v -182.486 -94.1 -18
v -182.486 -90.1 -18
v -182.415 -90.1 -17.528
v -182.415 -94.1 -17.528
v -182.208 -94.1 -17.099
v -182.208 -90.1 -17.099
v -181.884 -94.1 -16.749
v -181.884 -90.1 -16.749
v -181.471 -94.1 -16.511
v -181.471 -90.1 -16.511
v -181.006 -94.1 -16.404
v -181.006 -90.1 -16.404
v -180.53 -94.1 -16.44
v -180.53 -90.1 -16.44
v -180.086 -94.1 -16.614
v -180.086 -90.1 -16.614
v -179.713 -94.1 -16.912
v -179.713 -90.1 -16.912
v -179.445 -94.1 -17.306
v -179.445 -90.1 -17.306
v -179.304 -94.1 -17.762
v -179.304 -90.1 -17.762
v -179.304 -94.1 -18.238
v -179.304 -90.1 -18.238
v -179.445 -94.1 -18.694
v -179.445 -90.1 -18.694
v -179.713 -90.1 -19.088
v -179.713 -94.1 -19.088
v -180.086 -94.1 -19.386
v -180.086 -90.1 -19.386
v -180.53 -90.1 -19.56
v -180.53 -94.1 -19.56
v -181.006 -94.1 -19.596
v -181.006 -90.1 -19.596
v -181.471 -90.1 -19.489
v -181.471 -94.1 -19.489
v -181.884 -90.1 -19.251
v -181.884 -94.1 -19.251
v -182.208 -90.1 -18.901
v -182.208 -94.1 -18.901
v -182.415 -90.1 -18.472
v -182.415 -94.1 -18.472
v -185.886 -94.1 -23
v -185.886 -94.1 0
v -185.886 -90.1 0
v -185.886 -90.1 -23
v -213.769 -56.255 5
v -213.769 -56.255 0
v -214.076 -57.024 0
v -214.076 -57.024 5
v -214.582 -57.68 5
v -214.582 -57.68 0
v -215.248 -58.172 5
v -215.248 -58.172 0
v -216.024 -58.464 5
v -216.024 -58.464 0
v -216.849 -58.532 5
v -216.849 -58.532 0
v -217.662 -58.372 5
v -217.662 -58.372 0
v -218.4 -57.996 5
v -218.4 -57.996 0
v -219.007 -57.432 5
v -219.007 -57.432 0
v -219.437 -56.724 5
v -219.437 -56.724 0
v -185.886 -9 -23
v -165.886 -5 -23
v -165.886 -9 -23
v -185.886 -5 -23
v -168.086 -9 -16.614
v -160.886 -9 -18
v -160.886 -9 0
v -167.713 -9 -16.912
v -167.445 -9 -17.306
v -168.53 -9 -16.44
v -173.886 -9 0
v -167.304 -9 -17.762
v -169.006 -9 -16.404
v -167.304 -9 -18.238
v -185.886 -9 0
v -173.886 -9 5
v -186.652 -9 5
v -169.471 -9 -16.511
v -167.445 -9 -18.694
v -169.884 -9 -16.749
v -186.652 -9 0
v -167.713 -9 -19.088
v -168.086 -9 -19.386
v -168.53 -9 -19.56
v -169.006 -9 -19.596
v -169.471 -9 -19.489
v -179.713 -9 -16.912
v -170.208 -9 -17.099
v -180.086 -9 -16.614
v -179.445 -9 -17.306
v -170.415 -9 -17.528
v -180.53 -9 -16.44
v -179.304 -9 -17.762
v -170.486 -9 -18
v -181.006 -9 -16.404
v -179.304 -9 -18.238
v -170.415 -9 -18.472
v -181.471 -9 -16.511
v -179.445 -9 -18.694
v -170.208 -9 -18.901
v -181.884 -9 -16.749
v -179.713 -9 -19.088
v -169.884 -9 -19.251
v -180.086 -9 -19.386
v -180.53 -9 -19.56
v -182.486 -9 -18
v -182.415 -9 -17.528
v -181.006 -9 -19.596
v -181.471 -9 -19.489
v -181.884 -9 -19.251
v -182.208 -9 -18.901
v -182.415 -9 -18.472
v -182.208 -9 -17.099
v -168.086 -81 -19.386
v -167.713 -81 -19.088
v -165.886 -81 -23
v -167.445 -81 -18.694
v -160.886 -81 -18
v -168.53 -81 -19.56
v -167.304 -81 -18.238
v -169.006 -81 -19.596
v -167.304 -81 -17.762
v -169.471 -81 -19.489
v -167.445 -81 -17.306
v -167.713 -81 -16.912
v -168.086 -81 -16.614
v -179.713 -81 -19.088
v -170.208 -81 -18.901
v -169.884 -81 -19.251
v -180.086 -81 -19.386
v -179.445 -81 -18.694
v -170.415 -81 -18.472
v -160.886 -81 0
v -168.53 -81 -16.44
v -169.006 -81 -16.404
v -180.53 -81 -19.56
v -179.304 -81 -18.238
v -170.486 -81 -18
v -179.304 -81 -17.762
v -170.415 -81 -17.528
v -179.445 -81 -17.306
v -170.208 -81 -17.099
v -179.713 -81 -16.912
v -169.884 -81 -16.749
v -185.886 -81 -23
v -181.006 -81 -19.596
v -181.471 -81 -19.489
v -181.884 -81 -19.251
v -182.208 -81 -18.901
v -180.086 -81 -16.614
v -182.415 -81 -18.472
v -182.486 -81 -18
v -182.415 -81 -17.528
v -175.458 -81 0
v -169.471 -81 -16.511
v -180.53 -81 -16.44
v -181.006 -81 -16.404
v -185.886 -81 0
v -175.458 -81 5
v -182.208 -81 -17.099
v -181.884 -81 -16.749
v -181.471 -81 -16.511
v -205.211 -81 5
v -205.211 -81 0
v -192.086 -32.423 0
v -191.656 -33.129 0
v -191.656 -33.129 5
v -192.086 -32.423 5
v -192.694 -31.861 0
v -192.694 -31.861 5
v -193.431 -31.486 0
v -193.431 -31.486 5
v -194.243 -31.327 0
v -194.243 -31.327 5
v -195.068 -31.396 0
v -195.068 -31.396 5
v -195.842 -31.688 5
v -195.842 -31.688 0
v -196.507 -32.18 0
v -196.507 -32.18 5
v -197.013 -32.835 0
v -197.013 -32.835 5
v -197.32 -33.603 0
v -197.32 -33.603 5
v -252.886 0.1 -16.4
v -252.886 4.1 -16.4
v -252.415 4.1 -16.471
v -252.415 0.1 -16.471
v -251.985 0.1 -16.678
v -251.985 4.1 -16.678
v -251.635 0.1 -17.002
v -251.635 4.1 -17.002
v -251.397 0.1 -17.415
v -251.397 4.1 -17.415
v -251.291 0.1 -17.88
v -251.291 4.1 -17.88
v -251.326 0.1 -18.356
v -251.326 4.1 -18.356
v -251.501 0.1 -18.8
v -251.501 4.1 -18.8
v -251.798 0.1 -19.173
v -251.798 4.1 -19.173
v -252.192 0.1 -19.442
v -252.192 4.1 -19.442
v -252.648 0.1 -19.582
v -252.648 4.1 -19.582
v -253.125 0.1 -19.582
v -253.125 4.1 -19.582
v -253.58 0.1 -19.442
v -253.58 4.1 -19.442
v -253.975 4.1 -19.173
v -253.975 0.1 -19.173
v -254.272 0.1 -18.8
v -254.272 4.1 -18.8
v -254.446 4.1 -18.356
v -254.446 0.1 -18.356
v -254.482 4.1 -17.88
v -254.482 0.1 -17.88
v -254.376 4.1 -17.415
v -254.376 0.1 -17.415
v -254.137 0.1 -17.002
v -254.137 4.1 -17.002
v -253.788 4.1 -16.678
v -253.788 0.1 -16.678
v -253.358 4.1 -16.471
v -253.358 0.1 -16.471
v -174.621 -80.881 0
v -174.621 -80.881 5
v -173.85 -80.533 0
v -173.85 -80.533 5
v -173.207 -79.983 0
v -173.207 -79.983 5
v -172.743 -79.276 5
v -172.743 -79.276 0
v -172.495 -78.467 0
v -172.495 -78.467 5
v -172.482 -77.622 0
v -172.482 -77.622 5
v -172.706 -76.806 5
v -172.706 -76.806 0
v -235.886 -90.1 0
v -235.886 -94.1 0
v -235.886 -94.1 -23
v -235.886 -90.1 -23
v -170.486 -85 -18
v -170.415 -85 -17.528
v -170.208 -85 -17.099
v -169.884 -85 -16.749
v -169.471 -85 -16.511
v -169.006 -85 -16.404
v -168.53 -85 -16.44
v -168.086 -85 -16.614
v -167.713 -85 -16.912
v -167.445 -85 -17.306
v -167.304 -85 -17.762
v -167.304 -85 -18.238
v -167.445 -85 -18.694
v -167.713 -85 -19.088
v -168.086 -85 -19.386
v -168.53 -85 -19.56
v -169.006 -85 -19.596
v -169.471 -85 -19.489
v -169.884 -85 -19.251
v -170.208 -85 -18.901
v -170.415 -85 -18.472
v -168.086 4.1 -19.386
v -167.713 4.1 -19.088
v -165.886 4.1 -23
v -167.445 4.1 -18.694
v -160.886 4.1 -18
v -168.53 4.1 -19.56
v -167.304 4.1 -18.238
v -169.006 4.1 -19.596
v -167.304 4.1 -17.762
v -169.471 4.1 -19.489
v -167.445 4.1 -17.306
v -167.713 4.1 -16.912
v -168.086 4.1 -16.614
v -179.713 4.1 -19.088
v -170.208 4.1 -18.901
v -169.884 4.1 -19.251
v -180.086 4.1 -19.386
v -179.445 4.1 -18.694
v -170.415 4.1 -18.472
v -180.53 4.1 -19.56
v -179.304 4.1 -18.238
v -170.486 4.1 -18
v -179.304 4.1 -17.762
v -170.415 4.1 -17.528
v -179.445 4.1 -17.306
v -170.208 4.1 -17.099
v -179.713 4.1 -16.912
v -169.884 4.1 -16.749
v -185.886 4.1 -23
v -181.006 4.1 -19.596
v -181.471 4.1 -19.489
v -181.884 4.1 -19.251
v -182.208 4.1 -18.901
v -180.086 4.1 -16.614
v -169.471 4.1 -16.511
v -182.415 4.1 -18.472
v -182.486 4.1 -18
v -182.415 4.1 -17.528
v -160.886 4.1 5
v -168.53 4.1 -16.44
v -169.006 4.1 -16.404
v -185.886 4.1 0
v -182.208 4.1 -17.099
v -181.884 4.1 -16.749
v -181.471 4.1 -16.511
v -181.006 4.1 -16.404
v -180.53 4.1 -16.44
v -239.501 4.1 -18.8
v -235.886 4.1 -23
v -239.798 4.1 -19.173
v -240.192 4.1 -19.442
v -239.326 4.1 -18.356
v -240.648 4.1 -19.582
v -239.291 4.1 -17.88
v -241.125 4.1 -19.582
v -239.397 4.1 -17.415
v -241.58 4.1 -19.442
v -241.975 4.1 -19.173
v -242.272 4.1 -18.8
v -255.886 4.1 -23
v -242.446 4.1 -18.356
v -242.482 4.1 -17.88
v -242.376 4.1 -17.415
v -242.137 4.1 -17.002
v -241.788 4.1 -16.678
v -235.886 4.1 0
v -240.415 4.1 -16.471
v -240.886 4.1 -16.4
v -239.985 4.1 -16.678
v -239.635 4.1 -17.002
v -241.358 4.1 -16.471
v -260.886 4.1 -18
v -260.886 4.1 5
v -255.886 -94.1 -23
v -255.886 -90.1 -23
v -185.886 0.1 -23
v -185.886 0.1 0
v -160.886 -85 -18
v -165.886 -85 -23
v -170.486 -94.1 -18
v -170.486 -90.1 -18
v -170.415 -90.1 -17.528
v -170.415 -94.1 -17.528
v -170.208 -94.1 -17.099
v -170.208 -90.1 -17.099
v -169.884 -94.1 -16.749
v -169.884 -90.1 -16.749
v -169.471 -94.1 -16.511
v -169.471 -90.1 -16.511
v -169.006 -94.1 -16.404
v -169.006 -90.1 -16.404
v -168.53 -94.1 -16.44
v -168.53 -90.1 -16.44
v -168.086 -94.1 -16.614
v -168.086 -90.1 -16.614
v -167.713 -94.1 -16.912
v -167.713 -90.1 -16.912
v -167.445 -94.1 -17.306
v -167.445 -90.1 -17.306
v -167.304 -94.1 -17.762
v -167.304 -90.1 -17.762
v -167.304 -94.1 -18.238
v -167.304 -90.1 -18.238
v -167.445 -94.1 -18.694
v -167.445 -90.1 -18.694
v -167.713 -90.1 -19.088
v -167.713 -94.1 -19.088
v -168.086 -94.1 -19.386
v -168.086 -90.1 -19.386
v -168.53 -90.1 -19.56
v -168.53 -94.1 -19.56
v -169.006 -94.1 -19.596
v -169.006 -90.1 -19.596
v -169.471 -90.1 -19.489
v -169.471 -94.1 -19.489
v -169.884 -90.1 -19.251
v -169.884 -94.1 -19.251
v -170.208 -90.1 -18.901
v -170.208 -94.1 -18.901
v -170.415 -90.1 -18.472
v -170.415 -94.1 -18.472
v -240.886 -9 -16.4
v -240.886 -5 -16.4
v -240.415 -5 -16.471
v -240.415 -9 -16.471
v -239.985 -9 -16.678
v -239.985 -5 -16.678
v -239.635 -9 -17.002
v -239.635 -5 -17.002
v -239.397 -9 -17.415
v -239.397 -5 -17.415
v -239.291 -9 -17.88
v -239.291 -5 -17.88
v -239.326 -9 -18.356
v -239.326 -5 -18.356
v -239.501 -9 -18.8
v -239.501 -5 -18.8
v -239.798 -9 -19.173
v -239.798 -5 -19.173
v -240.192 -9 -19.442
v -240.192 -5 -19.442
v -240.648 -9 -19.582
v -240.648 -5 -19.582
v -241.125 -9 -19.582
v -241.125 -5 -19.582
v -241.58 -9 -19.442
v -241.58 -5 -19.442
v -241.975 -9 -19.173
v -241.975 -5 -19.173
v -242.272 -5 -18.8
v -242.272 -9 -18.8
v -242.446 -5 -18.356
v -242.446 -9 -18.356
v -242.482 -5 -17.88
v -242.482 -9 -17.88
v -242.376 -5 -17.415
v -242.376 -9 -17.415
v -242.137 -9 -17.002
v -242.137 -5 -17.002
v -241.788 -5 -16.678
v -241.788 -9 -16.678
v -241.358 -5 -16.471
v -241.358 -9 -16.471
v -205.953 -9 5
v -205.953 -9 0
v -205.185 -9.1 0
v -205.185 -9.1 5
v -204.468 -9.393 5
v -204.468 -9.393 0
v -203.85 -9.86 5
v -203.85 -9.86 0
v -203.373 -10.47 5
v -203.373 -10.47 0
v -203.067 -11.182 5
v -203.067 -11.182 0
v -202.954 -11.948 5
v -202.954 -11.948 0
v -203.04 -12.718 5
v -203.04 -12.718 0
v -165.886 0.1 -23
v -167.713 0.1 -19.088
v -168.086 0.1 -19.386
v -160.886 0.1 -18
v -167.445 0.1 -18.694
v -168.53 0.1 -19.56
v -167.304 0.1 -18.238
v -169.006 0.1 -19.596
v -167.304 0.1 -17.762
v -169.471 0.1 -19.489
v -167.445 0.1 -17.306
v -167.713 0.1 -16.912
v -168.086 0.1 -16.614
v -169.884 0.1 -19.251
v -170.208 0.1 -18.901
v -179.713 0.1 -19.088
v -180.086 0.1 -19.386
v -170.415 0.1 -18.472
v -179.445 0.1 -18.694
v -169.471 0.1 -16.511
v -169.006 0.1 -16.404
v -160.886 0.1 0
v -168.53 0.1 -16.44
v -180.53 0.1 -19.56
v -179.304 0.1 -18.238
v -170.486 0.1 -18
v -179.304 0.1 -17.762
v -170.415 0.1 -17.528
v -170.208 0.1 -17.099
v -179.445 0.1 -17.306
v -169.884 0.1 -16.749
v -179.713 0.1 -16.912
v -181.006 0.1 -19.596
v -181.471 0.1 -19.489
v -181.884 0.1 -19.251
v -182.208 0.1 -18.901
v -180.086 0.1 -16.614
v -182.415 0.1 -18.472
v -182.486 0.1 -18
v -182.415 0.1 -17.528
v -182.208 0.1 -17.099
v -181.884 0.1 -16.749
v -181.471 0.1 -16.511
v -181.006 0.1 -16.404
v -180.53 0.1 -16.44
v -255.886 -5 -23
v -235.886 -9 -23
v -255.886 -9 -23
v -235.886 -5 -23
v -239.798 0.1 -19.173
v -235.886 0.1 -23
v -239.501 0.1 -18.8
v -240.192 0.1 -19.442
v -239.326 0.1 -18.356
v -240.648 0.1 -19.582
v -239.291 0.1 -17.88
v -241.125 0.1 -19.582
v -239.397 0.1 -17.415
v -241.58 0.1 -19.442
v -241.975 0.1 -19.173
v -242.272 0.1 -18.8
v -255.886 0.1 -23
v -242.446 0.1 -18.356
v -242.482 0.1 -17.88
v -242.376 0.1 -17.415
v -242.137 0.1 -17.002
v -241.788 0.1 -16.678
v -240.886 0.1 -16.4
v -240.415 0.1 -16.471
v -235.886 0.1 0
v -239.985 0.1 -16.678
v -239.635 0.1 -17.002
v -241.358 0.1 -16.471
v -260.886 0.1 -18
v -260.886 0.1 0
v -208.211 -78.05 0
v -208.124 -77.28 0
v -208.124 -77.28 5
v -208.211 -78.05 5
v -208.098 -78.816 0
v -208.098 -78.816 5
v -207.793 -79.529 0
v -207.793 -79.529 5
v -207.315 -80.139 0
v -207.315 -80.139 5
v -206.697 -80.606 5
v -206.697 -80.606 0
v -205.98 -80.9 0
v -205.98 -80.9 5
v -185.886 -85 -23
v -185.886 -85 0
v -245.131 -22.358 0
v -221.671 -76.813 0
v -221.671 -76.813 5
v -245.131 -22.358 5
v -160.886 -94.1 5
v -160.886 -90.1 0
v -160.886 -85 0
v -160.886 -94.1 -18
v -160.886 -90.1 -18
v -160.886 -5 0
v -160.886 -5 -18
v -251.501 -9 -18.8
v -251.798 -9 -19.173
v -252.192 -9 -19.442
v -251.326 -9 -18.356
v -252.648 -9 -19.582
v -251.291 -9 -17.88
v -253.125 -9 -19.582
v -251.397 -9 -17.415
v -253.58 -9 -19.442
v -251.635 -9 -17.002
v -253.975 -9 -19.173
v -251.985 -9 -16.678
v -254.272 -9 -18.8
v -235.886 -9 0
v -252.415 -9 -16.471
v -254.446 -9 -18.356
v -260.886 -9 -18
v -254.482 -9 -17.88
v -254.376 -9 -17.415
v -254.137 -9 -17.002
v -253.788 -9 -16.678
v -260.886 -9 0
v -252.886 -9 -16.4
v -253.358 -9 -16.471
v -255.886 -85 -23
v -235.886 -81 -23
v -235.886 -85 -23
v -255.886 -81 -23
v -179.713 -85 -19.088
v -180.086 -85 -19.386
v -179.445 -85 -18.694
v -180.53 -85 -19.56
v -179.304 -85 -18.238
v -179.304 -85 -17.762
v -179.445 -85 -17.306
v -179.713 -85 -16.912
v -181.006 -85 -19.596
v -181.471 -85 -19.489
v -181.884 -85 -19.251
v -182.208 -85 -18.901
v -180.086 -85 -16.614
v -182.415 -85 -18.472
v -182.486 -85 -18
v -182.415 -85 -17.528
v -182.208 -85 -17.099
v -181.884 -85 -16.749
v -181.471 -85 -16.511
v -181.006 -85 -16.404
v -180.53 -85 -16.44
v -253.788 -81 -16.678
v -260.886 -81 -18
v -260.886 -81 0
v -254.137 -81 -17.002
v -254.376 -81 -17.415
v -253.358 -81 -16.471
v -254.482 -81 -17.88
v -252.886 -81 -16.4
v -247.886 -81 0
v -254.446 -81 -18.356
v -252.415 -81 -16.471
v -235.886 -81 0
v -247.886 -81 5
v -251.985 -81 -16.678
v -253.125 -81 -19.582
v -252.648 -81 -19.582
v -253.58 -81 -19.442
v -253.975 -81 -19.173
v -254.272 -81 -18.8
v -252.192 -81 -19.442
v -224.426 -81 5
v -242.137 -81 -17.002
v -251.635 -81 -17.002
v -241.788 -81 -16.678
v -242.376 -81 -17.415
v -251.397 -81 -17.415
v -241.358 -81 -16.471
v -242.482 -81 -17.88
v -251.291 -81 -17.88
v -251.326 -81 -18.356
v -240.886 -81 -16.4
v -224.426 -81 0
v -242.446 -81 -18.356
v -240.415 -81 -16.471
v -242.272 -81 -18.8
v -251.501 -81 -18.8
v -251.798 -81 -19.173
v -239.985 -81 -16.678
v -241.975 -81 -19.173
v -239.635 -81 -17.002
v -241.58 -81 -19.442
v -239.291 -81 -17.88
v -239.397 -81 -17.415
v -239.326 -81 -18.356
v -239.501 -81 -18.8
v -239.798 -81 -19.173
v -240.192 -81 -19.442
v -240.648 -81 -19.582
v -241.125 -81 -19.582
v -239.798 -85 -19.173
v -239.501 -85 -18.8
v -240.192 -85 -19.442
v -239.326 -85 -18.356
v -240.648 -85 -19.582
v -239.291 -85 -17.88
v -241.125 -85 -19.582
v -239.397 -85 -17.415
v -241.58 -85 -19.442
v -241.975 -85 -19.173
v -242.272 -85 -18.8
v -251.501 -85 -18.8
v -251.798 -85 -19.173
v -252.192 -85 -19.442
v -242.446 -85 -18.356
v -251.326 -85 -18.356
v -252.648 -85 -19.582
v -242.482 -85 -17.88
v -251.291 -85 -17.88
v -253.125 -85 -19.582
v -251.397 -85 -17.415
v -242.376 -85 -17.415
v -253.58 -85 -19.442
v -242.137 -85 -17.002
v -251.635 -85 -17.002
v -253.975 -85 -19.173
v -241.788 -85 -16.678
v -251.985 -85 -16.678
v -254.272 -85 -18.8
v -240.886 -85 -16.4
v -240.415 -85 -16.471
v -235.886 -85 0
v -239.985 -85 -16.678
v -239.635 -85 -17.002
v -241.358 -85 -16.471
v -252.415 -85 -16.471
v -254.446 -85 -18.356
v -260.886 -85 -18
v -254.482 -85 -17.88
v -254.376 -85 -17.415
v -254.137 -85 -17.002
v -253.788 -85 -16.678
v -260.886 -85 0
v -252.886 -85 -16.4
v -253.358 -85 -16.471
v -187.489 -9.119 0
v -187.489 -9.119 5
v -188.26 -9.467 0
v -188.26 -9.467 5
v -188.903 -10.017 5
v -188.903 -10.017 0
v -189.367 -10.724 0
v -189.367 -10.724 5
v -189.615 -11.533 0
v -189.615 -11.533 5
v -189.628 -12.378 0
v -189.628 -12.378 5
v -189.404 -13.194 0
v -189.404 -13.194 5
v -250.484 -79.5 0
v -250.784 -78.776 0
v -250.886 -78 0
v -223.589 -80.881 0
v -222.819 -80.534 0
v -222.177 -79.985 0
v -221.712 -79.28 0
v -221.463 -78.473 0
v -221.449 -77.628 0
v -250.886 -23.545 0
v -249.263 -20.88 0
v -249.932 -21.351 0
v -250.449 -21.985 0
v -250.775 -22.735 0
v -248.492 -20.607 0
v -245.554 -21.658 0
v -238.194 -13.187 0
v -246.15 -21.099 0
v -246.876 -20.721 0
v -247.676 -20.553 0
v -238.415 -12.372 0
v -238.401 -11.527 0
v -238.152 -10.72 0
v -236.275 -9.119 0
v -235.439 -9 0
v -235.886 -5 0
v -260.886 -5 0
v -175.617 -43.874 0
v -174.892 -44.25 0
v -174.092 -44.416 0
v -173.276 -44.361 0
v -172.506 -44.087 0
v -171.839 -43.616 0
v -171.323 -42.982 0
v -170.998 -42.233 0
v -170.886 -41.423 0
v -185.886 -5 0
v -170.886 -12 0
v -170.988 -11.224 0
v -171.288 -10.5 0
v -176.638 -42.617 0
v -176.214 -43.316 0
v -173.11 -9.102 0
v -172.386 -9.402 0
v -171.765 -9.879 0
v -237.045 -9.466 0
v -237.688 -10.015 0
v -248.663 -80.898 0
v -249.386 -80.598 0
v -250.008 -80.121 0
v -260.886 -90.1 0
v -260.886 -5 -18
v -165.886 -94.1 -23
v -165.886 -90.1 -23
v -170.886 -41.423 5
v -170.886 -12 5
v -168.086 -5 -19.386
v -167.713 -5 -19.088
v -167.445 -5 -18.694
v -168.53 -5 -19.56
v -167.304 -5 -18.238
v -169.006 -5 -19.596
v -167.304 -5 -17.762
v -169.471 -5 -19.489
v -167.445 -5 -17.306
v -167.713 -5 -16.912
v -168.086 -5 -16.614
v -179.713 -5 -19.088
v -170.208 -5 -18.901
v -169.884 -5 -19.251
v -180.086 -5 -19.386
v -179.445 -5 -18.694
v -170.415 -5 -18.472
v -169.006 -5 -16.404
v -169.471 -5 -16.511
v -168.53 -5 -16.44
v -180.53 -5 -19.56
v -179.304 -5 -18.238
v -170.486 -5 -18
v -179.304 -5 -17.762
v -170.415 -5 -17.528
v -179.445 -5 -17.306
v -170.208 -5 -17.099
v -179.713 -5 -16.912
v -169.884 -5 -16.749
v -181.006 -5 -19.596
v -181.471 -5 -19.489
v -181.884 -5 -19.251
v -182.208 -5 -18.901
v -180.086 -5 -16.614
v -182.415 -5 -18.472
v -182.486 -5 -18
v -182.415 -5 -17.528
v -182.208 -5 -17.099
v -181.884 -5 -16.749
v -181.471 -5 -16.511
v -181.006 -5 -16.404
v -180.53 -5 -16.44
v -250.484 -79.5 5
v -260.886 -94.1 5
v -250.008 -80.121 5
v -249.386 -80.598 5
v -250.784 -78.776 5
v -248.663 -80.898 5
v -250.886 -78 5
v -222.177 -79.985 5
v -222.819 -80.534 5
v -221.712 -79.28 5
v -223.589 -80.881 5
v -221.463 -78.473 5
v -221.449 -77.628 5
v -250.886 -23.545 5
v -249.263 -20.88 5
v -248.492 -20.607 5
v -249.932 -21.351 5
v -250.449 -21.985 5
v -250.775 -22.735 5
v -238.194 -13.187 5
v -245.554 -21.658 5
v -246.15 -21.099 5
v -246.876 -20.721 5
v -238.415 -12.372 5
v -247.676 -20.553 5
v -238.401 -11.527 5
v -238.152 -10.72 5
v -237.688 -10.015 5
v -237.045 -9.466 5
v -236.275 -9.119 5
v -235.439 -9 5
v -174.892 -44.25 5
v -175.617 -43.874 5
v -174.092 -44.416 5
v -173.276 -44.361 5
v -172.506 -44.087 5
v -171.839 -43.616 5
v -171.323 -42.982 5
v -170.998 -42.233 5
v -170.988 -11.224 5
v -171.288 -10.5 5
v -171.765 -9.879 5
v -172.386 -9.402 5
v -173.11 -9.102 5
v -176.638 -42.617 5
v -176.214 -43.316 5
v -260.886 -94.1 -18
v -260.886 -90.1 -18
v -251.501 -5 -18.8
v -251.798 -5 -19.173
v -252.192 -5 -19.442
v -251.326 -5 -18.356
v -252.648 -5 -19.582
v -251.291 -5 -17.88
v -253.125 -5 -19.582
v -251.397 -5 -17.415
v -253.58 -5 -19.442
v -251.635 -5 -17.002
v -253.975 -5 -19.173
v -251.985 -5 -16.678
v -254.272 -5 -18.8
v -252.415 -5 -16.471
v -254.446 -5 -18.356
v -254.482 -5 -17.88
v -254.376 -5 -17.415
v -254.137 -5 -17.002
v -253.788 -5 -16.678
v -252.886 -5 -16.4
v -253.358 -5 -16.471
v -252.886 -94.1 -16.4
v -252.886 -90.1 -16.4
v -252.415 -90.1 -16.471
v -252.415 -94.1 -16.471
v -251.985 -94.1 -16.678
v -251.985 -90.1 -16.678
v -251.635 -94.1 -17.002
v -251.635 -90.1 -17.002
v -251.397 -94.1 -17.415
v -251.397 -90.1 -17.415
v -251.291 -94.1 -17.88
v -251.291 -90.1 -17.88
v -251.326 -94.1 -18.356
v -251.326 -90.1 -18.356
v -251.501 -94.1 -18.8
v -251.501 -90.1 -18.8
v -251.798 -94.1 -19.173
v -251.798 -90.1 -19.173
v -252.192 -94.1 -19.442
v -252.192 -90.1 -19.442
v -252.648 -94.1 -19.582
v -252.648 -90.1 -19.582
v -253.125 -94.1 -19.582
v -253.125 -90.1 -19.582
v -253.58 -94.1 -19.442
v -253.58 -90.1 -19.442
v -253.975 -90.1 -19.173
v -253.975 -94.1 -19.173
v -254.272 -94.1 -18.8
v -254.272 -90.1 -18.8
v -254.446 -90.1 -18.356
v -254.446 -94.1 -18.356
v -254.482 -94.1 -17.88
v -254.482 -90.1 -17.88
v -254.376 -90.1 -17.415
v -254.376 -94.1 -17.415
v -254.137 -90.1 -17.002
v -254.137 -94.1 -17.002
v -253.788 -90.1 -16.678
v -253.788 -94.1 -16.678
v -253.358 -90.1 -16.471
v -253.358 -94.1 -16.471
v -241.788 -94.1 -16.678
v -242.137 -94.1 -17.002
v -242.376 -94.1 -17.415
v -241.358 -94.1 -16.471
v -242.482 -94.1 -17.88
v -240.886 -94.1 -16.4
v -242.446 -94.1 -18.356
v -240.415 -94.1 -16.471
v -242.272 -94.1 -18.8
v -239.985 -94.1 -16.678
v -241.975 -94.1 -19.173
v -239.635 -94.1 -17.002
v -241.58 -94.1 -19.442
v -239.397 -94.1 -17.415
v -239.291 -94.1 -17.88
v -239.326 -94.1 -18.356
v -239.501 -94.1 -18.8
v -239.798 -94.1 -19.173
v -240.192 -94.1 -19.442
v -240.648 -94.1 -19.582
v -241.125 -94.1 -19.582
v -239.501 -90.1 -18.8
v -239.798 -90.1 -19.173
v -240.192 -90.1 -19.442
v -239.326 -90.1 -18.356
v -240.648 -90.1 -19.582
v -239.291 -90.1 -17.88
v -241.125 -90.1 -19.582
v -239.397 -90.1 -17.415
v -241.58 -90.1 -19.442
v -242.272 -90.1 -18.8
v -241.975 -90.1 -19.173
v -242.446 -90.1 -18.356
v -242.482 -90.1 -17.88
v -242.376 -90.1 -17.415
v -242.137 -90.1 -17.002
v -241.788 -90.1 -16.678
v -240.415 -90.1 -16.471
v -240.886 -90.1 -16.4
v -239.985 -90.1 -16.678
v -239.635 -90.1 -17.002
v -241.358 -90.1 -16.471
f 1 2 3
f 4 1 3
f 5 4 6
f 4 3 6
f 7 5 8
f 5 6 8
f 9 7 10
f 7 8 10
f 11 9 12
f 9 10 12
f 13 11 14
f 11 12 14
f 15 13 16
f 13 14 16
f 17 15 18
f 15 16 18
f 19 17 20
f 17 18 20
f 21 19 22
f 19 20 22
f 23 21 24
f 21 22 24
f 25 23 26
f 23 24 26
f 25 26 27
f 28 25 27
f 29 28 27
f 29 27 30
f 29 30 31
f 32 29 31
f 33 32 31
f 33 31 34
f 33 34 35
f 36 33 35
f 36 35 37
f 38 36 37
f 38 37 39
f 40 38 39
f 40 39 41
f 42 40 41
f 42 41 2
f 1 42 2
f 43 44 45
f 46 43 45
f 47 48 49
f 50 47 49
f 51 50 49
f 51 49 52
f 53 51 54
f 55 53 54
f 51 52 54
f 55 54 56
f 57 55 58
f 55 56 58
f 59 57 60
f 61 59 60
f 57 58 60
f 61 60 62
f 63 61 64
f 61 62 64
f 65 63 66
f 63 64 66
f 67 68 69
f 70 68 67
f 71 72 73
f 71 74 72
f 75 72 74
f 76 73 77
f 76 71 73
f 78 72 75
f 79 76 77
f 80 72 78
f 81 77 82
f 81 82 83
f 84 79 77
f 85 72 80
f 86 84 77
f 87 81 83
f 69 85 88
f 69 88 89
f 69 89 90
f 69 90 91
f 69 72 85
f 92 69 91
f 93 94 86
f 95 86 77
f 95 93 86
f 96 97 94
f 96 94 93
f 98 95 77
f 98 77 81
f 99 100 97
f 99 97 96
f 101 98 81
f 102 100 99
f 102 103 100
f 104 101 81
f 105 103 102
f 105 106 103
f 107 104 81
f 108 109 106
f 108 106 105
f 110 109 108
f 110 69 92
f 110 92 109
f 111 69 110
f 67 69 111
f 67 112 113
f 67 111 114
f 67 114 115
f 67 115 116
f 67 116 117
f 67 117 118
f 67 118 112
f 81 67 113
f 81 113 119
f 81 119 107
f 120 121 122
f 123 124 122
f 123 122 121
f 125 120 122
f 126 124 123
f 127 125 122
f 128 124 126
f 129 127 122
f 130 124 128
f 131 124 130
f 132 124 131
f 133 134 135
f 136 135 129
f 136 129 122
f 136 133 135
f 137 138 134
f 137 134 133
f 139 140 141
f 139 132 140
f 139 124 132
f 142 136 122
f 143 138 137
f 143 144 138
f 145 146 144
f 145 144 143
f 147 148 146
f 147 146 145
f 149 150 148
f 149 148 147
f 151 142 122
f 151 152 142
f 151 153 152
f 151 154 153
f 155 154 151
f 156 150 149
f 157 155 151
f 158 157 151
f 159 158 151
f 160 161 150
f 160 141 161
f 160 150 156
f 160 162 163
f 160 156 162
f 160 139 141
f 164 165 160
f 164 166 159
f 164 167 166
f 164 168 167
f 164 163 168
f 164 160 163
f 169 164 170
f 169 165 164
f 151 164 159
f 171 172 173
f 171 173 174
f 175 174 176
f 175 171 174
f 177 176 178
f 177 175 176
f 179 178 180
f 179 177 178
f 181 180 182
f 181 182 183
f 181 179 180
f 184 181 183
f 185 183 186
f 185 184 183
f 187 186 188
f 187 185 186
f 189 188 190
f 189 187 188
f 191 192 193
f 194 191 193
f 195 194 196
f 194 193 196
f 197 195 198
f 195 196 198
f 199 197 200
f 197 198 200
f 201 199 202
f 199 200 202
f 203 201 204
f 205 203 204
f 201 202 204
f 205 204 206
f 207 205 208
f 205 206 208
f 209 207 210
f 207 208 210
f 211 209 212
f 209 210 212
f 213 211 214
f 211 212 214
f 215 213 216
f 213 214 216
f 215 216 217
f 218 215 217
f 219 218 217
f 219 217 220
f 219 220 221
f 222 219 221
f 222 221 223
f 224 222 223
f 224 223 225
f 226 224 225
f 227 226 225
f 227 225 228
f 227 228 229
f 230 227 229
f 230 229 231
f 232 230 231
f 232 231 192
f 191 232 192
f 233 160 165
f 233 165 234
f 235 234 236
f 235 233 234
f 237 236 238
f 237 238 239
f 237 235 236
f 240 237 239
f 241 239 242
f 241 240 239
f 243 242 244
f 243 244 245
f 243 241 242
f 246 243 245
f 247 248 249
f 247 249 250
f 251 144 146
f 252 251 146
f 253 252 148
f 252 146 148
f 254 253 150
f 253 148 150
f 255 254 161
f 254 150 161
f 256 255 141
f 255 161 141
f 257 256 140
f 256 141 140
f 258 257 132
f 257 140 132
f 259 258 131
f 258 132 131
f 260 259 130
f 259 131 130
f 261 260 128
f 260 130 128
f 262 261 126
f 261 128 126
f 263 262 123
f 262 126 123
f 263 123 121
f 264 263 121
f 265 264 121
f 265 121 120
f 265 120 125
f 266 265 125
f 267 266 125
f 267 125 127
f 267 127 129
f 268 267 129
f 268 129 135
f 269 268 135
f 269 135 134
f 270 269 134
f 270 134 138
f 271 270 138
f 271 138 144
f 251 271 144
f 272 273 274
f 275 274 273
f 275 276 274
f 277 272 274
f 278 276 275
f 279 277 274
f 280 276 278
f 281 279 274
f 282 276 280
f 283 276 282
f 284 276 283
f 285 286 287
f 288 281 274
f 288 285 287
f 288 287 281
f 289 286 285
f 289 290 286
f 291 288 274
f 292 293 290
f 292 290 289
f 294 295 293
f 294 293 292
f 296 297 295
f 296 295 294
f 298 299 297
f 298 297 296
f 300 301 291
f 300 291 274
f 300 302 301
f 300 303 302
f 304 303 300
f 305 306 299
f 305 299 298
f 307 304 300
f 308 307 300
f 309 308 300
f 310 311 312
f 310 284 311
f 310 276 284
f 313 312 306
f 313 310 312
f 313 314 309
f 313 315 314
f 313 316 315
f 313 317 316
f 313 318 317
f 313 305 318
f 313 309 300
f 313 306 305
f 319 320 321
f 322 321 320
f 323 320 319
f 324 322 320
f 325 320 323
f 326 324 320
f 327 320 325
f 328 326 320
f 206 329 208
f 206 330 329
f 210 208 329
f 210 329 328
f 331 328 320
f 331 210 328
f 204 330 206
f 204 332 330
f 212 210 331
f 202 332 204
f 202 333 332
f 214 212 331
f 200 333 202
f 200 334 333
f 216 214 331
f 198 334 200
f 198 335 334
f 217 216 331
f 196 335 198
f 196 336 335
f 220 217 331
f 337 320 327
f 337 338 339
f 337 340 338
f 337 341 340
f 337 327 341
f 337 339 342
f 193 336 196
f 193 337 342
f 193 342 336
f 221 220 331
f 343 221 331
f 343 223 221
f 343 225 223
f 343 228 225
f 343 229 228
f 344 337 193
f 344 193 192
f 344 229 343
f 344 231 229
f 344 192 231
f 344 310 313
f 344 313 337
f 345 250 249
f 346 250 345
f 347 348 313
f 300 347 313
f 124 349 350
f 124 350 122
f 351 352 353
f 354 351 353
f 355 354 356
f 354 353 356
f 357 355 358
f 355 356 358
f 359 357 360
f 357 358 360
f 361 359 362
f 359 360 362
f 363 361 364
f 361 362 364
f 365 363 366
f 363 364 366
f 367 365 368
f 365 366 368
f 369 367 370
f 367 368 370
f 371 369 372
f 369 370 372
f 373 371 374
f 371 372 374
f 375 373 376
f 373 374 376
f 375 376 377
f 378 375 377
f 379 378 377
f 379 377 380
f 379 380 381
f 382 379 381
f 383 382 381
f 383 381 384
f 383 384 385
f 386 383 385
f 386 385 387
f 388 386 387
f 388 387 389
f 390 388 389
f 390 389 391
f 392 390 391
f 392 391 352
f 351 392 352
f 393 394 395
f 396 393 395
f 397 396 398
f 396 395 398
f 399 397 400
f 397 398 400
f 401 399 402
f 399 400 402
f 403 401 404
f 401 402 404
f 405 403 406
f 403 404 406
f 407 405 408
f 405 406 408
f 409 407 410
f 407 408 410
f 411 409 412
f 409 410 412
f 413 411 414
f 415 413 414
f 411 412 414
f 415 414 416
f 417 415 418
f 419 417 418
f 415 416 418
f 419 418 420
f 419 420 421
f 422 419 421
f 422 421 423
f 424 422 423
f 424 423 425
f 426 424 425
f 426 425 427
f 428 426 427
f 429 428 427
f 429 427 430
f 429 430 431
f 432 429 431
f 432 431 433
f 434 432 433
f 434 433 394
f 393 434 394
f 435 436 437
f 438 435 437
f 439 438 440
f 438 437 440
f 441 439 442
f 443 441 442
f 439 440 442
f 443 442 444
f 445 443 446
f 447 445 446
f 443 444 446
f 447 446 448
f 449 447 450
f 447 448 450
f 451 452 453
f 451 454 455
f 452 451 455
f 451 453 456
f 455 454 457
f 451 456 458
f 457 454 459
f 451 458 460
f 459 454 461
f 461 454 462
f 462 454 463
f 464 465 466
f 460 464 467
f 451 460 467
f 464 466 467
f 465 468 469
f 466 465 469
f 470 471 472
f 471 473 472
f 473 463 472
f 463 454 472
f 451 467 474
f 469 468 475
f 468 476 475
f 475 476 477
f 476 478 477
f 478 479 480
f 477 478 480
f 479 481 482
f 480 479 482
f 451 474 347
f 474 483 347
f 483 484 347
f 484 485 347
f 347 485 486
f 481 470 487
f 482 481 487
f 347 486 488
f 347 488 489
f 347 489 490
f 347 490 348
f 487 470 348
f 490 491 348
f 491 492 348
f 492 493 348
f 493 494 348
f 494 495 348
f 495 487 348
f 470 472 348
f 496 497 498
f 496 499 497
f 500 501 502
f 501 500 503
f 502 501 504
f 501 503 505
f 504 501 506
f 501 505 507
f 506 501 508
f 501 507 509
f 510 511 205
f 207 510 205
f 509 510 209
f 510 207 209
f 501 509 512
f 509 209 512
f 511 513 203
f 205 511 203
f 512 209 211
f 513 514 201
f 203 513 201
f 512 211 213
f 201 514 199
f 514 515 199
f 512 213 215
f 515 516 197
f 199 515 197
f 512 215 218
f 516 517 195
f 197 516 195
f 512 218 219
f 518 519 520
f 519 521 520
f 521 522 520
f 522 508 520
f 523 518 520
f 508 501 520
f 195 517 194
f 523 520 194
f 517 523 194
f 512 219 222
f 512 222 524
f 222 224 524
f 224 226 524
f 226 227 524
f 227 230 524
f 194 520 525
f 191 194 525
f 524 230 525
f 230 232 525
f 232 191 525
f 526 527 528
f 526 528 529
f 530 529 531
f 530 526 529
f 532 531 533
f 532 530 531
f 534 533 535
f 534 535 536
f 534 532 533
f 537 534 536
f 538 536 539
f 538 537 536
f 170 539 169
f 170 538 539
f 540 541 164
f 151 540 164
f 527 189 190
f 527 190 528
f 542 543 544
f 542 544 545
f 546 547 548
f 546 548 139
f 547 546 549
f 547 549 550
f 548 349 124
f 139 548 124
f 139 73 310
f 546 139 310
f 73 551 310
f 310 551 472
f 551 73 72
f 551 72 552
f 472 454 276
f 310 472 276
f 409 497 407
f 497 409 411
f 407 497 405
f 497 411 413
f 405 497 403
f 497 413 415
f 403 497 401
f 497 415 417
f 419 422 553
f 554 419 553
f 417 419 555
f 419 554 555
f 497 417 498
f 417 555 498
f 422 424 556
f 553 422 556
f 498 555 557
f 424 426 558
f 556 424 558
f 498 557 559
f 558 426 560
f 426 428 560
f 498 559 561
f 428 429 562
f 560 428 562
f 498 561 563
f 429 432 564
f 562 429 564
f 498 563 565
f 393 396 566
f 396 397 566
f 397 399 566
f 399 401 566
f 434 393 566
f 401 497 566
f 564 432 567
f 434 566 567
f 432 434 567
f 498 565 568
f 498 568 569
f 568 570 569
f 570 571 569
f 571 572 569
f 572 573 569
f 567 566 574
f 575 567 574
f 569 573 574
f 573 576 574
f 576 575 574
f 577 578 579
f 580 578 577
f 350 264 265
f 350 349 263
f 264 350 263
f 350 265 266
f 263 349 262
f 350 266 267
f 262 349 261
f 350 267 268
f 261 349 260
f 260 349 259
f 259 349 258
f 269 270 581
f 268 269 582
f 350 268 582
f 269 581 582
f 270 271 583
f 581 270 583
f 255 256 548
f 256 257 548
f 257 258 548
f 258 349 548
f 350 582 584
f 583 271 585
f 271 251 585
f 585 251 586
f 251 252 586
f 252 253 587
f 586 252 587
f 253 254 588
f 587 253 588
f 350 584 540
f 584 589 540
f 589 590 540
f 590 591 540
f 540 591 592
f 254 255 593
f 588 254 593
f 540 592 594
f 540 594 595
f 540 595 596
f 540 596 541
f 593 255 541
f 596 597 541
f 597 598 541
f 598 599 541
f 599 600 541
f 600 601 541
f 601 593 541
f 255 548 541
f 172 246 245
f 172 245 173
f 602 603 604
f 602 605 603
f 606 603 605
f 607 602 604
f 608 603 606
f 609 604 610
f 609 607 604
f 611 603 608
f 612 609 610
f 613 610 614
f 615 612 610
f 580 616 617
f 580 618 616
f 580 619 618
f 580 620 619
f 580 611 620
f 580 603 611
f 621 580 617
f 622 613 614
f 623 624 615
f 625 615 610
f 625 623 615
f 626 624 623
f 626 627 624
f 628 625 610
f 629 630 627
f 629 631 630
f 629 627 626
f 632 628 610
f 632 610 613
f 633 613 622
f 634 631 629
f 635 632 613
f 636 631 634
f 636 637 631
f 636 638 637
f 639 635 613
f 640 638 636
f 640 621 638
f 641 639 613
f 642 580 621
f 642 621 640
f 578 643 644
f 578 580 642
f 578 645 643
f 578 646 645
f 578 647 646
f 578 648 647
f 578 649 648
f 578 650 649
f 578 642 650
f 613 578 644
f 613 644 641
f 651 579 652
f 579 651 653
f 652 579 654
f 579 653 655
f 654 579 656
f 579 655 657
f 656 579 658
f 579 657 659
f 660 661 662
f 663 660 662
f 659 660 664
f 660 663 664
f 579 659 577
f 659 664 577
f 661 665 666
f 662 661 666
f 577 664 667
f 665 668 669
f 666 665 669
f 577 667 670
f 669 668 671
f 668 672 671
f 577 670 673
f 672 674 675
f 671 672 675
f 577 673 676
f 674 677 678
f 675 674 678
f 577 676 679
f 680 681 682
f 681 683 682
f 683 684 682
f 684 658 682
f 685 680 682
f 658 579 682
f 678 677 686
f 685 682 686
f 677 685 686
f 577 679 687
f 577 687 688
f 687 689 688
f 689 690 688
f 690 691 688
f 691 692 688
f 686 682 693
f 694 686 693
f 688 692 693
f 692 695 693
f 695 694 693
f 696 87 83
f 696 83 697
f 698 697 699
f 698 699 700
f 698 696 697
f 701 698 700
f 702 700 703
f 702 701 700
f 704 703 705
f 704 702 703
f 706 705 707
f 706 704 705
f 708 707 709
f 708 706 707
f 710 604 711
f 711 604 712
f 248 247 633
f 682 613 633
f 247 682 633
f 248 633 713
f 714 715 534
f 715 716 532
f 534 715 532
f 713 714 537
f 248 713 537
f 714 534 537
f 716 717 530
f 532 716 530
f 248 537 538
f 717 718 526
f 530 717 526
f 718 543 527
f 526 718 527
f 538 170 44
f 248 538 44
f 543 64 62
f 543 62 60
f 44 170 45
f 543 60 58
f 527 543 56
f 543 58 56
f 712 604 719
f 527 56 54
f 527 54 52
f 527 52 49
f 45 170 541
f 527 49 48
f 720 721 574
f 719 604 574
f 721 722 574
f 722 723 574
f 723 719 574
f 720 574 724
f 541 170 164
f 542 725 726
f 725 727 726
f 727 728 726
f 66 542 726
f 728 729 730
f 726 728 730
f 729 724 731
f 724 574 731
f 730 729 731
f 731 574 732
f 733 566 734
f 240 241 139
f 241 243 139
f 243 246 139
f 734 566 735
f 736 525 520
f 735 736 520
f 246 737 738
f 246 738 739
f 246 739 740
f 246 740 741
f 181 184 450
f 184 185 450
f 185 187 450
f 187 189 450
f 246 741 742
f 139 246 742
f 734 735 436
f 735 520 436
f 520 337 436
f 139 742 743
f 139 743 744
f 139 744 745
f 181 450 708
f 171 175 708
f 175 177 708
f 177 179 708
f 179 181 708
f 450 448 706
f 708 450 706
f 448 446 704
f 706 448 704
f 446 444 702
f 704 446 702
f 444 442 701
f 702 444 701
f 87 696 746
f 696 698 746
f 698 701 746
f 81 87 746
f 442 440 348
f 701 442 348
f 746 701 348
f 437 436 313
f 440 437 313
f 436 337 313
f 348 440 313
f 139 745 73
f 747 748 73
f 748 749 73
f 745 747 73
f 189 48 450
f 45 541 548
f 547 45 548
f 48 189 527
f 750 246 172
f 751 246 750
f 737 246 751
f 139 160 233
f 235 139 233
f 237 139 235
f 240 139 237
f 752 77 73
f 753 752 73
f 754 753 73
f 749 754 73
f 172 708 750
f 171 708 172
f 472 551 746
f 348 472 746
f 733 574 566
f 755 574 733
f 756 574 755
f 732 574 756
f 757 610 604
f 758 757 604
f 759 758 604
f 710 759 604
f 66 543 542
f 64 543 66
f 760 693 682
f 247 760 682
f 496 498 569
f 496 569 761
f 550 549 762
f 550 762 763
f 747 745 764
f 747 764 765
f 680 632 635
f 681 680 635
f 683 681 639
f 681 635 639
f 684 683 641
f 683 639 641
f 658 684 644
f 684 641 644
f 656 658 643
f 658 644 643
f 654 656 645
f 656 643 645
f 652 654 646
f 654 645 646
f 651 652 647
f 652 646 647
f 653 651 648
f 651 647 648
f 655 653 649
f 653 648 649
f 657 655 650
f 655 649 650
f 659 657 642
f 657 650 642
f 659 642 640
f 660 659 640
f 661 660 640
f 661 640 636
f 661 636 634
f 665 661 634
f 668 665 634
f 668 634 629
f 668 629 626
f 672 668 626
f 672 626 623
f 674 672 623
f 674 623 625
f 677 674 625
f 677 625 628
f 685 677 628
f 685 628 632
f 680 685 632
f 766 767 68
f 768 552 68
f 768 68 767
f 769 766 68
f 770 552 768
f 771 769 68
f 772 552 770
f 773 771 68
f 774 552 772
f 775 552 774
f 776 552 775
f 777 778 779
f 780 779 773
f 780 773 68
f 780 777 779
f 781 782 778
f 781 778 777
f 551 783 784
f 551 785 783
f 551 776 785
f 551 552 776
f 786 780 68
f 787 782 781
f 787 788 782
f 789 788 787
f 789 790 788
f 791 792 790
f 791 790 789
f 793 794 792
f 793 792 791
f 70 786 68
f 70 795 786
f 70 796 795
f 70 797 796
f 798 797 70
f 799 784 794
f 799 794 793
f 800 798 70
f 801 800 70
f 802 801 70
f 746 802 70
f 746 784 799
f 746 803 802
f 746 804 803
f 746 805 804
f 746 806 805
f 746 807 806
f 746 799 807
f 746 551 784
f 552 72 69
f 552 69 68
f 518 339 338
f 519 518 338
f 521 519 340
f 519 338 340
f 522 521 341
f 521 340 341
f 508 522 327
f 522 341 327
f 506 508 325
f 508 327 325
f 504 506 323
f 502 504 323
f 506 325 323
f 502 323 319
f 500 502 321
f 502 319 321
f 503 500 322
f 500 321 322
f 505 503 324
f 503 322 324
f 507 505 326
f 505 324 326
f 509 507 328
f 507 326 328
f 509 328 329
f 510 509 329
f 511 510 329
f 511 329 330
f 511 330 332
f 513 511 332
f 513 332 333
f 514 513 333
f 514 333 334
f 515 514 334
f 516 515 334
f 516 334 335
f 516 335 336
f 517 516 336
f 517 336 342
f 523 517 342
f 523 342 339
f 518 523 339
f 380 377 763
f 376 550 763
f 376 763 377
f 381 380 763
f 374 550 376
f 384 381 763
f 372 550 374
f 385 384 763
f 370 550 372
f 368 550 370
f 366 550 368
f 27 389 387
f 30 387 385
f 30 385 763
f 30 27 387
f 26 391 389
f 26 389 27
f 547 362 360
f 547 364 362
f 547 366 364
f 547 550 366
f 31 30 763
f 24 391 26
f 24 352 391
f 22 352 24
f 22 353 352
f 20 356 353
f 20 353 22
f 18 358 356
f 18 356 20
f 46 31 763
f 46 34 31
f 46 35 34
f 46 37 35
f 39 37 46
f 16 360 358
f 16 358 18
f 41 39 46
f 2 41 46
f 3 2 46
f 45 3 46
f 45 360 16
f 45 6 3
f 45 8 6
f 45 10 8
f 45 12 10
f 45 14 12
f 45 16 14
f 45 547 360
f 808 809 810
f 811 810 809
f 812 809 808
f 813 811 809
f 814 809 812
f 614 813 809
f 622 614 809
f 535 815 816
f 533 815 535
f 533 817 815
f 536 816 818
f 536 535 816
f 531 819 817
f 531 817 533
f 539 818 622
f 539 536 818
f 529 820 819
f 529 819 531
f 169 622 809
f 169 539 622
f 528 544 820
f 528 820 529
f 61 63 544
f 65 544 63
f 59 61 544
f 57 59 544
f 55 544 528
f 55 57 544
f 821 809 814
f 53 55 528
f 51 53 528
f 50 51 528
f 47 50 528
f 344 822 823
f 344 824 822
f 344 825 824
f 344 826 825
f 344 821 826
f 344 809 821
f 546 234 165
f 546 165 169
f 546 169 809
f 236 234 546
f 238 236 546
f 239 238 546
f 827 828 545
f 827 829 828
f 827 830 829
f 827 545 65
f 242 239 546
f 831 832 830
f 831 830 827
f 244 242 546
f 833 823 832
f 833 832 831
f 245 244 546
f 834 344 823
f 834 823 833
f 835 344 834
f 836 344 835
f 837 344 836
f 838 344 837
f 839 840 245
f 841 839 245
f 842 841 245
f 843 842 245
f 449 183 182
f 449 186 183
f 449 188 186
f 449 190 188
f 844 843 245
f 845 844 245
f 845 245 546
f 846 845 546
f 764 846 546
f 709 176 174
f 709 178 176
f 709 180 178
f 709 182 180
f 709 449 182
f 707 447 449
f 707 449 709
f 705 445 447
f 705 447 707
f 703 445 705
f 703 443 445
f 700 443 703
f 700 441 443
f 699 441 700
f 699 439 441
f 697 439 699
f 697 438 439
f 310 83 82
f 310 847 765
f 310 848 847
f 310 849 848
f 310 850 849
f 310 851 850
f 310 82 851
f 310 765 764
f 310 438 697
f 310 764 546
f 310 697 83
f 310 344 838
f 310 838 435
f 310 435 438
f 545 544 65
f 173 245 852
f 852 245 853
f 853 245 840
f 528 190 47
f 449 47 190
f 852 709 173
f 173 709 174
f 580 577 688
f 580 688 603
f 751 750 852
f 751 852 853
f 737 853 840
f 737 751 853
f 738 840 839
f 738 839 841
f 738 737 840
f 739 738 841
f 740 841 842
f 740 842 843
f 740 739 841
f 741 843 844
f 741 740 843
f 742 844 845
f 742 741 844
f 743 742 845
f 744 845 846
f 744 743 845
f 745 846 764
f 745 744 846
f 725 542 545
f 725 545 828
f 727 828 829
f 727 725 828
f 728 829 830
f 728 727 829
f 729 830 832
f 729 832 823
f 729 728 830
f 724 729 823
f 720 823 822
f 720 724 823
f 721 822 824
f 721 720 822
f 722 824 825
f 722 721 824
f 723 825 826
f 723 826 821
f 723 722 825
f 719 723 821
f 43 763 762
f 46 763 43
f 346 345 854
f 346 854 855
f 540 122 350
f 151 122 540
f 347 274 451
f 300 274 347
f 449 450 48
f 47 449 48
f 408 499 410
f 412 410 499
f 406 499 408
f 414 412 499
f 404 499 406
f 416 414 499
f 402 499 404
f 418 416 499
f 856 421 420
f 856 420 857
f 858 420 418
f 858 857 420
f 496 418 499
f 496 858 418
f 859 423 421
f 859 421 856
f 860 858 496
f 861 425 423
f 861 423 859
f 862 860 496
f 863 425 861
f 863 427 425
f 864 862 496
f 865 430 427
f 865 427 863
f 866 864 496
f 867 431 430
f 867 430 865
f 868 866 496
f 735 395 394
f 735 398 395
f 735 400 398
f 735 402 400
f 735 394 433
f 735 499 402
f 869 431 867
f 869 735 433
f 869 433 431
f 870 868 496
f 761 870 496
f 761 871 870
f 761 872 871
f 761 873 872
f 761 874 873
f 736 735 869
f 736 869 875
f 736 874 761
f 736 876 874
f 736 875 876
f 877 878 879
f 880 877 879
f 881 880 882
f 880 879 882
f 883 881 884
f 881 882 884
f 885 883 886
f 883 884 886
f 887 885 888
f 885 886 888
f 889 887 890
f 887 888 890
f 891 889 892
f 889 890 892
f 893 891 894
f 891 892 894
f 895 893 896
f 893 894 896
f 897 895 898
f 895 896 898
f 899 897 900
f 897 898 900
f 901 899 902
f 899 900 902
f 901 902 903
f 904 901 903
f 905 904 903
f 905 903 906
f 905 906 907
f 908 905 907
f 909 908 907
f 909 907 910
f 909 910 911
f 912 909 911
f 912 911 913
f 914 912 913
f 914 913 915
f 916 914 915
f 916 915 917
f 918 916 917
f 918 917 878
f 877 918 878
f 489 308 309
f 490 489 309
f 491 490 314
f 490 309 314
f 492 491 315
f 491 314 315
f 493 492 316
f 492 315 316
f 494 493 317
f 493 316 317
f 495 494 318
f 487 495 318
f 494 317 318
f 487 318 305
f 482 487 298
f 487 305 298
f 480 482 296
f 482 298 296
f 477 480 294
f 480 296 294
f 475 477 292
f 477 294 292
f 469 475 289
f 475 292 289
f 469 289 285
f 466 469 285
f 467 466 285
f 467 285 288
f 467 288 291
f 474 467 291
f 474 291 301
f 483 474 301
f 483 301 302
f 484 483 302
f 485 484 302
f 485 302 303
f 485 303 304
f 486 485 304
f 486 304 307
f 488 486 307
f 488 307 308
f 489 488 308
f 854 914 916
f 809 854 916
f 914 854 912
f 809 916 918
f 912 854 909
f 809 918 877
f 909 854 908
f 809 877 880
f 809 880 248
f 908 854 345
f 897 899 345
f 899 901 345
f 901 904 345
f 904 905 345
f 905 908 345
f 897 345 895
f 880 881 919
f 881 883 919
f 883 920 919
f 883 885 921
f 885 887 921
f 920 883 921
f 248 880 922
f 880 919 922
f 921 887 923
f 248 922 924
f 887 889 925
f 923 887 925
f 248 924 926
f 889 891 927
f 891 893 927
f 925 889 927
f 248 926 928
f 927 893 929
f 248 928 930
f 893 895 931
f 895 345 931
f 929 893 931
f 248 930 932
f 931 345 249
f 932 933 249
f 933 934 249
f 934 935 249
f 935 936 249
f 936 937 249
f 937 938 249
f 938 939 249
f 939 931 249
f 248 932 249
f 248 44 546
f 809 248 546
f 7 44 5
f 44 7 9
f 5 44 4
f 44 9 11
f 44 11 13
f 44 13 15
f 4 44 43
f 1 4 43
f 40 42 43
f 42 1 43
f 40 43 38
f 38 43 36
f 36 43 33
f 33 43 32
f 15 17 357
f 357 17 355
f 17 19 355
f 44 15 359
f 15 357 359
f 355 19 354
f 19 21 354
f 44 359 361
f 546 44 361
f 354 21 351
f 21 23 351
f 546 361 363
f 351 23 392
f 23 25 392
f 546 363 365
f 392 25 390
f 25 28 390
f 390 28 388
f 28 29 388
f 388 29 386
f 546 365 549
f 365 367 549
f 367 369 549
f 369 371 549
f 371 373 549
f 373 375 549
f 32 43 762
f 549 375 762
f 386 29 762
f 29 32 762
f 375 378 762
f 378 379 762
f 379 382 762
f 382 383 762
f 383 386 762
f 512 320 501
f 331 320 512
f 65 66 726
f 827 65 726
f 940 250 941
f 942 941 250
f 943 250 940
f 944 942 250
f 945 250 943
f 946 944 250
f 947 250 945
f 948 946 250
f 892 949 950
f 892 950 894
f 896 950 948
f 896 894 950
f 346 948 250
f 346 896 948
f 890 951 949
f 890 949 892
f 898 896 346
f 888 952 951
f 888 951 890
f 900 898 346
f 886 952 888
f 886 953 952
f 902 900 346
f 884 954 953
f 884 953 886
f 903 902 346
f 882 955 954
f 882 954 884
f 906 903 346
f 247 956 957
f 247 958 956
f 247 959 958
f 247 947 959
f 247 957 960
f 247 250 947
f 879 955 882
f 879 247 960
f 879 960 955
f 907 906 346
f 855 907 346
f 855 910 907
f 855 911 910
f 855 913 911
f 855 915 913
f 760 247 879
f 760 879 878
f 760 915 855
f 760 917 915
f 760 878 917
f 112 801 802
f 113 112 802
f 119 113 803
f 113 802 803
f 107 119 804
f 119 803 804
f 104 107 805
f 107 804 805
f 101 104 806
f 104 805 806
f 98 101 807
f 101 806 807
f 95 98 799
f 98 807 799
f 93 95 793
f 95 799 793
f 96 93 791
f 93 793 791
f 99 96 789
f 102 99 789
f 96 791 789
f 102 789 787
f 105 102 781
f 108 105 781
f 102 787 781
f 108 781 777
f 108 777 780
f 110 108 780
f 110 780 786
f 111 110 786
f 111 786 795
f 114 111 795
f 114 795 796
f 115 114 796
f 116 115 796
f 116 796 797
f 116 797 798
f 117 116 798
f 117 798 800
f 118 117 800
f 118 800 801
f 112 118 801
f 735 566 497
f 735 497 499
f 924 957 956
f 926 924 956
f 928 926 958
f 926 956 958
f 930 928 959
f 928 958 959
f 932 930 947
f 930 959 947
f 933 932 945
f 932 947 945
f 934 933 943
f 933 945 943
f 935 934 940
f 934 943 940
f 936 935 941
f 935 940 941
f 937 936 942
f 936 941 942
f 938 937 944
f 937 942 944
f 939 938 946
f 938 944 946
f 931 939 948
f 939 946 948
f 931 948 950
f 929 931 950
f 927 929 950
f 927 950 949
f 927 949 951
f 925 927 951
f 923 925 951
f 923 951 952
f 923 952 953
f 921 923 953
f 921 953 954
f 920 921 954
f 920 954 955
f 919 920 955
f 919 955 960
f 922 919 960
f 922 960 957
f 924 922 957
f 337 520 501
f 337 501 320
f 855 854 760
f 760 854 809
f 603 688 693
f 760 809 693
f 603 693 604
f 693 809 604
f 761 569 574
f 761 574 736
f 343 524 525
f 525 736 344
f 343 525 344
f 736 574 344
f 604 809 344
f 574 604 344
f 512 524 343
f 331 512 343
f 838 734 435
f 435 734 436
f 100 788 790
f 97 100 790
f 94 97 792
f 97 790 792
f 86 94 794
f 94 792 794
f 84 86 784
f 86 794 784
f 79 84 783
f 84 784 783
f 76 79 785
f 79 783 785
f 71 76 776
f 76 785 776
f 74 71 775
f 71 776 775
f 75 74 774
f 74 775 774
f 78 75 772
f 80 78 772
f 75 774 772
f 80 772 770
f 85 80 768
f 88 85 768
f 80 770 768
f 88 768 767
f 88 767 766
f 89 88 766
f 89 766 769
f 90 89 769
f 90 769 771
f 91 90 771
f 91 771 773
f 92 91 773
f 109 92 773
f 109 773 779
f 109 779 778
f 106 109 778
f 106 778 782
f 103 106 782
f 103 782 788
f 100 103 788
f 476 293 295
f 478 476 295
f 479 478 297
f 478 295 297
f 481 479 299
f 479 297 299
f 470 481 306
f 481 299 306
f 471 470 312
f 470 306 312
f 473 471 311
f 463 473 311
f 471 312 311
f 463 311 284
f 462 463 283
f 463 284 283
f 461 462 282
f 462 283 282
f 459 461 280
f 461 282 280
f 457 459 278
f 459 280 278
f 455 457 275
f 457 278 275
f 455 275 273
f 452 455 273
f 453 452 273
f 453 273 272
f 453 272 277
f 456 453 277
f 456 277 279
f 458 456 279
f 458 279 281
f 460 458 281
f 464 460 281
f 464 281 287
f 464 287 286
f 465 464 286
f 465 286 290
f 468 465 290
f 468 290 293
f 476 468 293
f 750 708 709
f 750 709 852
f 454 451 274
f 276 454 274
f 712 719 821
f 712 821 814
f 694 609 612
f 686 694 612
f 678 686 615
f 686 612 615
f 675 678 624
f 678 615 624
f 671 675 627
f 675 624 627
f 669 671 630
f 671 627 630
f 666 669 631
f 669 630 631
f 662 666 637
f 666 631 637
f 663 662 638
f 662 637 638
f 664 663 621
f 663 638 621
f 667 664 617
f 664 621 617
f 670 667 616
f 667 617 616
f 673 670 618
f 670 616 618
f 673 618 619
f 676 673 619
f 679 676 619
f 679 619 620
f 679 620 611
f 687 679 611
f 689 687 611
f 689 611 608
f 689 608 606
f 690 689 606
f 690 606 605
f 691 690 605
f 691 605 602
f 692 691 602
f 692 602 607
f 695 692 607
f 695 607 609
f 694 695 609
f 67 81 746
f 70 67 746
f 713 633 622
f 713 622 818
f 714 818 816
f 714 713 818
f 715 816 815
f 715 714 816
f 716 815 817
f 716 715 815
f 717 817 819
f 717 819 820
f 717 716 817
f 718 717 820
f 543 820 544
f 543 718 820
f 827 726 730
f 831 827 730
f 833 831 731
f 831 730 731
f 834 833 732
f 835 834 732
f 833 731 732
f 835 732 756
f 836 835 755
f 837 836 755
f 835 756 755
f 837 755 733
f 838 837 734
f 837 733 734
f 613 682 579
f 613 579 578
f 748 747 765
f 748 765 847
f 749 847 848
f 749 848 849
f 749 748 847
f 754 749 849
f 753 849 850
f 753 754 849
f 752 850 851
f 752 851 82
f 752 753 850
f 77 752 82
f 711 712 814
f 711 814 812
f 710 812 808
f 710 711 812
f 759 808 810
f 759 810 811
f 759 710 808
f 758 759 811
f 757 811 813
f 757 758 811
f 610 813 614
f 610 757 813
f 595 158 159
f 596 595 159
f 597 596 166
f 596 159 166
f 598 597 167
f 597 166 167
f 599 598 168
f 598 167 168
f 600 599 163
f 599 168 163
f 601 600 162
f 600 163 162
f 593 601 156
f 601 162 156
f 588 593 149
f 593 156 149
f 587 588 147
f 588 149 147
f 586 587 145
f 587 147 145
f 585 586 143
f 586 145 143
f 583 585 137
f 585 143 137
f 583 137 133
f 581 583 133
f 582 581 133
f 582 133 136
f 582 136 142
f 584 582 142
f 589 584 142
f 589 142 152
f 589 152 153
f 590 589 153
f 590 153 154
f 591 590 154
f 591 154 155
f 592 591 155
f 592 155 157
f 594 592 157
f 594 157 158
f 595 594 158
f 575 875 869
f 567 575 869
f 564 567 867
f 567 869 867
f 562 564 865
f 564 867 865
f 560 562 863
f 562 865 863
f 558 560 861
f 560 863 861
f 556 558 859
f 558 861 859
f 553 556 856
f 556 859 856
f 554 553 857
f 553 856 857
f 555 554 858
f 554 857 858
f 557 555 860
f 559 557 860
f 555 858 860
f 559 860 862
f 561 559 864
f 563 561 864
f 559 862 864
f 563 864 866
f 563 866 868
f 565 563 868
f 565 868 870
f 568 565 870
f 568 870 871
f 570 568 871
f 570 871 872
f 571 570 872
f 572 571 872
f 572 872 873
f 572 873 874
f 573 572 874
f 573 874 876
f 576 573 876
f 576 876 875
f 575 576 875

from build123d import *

# Parameters (mm, degrees)
SKETCH_1_W          = 100
SKETCH_1_H          = 98.2
EXTRUDE_1_DEPTH     = 5
SKETCH_2_W          = 25
SKETCH_2_H          = 4
EXTRUDE_2_DEPTH     = 23
CHAMFER_1_SIZE      = 5
SKETCH_3_R          = 1.6
CUT_EXTRUDE_1_DEPTH = 100


with BuildPart() as part:
    # 草图1 → 凸台-拉伸1 (new body)
    with BuildSketch(Plane.XY):
        with Locations((-210.886237356, -45)):
            Rectangle(SKETCH_1_W, SKETCH_1_H)
        with BuildLine():
            ThreePointArc((-245.131057565, -22.358440495), (-248.492232664, -20.607289414), (-250.886237356, -23.545446947))
            Line((-250.886237356, -23.545446947), (-250.886237356, -78))
            ThreePointArc((-250.886237356, -78), (-250.0075577, -80.121320344), (-247.886237356, -81))
            Line((-247.886237356, -81), (-224.42573361, -81))
            ThreePointArc((-224.42573361, -81), (-221.919639103, -79.649087724), (-221.670553819, -76.812993548))
            Line((-221.670553819, -76.812993548), (-245.131057565, -22.358440495))
        make_face(mode=Mode.SUBTRACT)
        with BuildLine():
            ThreePointArc((-191.655684006, -33.128922342), (-194.657829236, -31.333405344), (-197.320051564, -33.602618764))
            Line((-197.320051564, -33.602618764), (-208.123721184, -77.279649032))
            ThreePointArc((-208.123721184, -77.279649032), (-207.573803103, -79.849181859), (-205.211489311, -81))
            Line((-205.211489311, -81), (-175.458011282, -81))
            ThreePointArc((-175.458011282, -81), (-172.949810516, -79.645882413), (-172.705875596, -76.805952611))
            Line((-172.705875596, -76.805952611), (-191.655684006, -33.128922342))
        make_face(mode=Mode.SUBTRACT)
        with BuildLine():
            ThreePointArc((-176.638373042, -42.617387799), (-173.276486201, -44.360720795), (-170.886237356, -41.42334041))
            Line((-170.886237356, -41.42334041), (-170.886237356, -12))
            ThreePointArc((-170.886237356, -12), (-171.764917013, -9.878679656), (-173.886237356, -9))
            Line((-173.886237356, -9), (-186.651909841, -9))
            ThreePointArc((-186.651909841, -9), (-189.160110607, -10.354117587), (-189.404045527, -13.194047389))
            Line((-189.404045527, -13.194047389), (-176.638373042, -42.617387799))
        make_face(mode=Mode.SUBTRACT)
        with BuildLine():
            Line((-203.040454286, -12.717792993), (-213.768880163, -56.2546336))
            ThreePointArc((-213.768880163, -56.2546336), (-216.43424337, -58.526613784), (-219.43692336, -56.723847059))
            Line((-219.43692336, -56.723847059), (-238.193779397, -13.187006452))
            ThreePointArc((-238.193779397, -13.187006452), (-237.944694112, -10.350912276), (-235.438599605, -9))
            Line((-235.438599605, -9), (-205.953317692, -9))
            ThreePointArc((-205.953317692, -9), (-203.591816159, -10.149780956), (-203.040454286, -12.717792993))
        make_face(mode=Mode.SUBTRACT)
    extrude(amount=EXTRUDE_1_DEPTH)

    # 草图2 → 凸台-拉伸2 (add)
    with BuildSketch(Plane(origin=(0, 0, 0), x_dir=(-1, 0, 0), z_dir=(0, 0, -1))):
        with Locations((248.386237356, 2.1)):
            Rectangle(SKETCH_2_W, SKETCH_2_H)
        with Locations((248.386237356, -7)):
            Rectangle(SKETCH_2_W, SKETCH_2_H)
        with Locations((173.386237356, -7)):
            Rectangle(SKETCH_2_W, SKETCH_2_H)
        with Locations((173.386237356, 2.1)):
            Rectangle(SKETCH_2_W, SKETCH_2_H)
        with Locations((173.386237356, -92.1)):
            Rectangle(SKETCH_2_W, SKETCH_2_H)
        with Locations((173.386237356, -83)):
            Rectangle(SKETCH_2_W, SKETCH_2_H)
        with Locations((248.386237356, -83)):
            Rectangle(SKETCH_2_W, SKETCH_2_H)
        with Locations((248.386237356, -92.1)):
            Rectangle(SKETCH_2_W, SKETCH_2_H)
    extrude(amount=EXTRUDE_2_DEPTH)

    # 倒角1
    chamfer_1_edges = [part.edges().sort_by_distance(p)[0] for p in [
        (-160.886237356, -7, -23),
        (-160.886237356, 2.1, -23),
        (-160.886237356, -92.1, -23),
        (-160.886237356, -83, -23),
        (-260.886237356, -83, -23),
        (-260.886237356, -92.1, -23),
        (-260.886237356, 2.1, -23),
        (-260.886237356, -7, -23),
    ]]
    chamfer(chamfer_1_edges, length=CHAMFER_1_SIZE)

    # 草图3 → 切除-拉伸1 (cut)
    with BuildSketch(Plane(origin=(0, 4.1, 0), x_dir=(1, 0, 0), z_dir=(0, 1, 0))):
        with Locations(Location((-252.886237356, 18, 0), (0, 0, 270))):
            Circle(SKETCH_3_R)
        with Locations(Location((-240.886237356, 18, 0), (0, 0, 270))):
            Circle(SKETCH_3_R)
        with Locations(Location((-180.886237356, 18, 0), (0, 0, 180))):
            Circle(SKETCH_3_R)
        with Locations(Location((-168.886237356, 18, 0), (0, 0, 180))):
            Circle(SKETCH_3_R)
    extrude(amount=-CUT_EXTRUDE_1_DEPTH, mode=Mode.SUBTRACT)


solid = part.part
